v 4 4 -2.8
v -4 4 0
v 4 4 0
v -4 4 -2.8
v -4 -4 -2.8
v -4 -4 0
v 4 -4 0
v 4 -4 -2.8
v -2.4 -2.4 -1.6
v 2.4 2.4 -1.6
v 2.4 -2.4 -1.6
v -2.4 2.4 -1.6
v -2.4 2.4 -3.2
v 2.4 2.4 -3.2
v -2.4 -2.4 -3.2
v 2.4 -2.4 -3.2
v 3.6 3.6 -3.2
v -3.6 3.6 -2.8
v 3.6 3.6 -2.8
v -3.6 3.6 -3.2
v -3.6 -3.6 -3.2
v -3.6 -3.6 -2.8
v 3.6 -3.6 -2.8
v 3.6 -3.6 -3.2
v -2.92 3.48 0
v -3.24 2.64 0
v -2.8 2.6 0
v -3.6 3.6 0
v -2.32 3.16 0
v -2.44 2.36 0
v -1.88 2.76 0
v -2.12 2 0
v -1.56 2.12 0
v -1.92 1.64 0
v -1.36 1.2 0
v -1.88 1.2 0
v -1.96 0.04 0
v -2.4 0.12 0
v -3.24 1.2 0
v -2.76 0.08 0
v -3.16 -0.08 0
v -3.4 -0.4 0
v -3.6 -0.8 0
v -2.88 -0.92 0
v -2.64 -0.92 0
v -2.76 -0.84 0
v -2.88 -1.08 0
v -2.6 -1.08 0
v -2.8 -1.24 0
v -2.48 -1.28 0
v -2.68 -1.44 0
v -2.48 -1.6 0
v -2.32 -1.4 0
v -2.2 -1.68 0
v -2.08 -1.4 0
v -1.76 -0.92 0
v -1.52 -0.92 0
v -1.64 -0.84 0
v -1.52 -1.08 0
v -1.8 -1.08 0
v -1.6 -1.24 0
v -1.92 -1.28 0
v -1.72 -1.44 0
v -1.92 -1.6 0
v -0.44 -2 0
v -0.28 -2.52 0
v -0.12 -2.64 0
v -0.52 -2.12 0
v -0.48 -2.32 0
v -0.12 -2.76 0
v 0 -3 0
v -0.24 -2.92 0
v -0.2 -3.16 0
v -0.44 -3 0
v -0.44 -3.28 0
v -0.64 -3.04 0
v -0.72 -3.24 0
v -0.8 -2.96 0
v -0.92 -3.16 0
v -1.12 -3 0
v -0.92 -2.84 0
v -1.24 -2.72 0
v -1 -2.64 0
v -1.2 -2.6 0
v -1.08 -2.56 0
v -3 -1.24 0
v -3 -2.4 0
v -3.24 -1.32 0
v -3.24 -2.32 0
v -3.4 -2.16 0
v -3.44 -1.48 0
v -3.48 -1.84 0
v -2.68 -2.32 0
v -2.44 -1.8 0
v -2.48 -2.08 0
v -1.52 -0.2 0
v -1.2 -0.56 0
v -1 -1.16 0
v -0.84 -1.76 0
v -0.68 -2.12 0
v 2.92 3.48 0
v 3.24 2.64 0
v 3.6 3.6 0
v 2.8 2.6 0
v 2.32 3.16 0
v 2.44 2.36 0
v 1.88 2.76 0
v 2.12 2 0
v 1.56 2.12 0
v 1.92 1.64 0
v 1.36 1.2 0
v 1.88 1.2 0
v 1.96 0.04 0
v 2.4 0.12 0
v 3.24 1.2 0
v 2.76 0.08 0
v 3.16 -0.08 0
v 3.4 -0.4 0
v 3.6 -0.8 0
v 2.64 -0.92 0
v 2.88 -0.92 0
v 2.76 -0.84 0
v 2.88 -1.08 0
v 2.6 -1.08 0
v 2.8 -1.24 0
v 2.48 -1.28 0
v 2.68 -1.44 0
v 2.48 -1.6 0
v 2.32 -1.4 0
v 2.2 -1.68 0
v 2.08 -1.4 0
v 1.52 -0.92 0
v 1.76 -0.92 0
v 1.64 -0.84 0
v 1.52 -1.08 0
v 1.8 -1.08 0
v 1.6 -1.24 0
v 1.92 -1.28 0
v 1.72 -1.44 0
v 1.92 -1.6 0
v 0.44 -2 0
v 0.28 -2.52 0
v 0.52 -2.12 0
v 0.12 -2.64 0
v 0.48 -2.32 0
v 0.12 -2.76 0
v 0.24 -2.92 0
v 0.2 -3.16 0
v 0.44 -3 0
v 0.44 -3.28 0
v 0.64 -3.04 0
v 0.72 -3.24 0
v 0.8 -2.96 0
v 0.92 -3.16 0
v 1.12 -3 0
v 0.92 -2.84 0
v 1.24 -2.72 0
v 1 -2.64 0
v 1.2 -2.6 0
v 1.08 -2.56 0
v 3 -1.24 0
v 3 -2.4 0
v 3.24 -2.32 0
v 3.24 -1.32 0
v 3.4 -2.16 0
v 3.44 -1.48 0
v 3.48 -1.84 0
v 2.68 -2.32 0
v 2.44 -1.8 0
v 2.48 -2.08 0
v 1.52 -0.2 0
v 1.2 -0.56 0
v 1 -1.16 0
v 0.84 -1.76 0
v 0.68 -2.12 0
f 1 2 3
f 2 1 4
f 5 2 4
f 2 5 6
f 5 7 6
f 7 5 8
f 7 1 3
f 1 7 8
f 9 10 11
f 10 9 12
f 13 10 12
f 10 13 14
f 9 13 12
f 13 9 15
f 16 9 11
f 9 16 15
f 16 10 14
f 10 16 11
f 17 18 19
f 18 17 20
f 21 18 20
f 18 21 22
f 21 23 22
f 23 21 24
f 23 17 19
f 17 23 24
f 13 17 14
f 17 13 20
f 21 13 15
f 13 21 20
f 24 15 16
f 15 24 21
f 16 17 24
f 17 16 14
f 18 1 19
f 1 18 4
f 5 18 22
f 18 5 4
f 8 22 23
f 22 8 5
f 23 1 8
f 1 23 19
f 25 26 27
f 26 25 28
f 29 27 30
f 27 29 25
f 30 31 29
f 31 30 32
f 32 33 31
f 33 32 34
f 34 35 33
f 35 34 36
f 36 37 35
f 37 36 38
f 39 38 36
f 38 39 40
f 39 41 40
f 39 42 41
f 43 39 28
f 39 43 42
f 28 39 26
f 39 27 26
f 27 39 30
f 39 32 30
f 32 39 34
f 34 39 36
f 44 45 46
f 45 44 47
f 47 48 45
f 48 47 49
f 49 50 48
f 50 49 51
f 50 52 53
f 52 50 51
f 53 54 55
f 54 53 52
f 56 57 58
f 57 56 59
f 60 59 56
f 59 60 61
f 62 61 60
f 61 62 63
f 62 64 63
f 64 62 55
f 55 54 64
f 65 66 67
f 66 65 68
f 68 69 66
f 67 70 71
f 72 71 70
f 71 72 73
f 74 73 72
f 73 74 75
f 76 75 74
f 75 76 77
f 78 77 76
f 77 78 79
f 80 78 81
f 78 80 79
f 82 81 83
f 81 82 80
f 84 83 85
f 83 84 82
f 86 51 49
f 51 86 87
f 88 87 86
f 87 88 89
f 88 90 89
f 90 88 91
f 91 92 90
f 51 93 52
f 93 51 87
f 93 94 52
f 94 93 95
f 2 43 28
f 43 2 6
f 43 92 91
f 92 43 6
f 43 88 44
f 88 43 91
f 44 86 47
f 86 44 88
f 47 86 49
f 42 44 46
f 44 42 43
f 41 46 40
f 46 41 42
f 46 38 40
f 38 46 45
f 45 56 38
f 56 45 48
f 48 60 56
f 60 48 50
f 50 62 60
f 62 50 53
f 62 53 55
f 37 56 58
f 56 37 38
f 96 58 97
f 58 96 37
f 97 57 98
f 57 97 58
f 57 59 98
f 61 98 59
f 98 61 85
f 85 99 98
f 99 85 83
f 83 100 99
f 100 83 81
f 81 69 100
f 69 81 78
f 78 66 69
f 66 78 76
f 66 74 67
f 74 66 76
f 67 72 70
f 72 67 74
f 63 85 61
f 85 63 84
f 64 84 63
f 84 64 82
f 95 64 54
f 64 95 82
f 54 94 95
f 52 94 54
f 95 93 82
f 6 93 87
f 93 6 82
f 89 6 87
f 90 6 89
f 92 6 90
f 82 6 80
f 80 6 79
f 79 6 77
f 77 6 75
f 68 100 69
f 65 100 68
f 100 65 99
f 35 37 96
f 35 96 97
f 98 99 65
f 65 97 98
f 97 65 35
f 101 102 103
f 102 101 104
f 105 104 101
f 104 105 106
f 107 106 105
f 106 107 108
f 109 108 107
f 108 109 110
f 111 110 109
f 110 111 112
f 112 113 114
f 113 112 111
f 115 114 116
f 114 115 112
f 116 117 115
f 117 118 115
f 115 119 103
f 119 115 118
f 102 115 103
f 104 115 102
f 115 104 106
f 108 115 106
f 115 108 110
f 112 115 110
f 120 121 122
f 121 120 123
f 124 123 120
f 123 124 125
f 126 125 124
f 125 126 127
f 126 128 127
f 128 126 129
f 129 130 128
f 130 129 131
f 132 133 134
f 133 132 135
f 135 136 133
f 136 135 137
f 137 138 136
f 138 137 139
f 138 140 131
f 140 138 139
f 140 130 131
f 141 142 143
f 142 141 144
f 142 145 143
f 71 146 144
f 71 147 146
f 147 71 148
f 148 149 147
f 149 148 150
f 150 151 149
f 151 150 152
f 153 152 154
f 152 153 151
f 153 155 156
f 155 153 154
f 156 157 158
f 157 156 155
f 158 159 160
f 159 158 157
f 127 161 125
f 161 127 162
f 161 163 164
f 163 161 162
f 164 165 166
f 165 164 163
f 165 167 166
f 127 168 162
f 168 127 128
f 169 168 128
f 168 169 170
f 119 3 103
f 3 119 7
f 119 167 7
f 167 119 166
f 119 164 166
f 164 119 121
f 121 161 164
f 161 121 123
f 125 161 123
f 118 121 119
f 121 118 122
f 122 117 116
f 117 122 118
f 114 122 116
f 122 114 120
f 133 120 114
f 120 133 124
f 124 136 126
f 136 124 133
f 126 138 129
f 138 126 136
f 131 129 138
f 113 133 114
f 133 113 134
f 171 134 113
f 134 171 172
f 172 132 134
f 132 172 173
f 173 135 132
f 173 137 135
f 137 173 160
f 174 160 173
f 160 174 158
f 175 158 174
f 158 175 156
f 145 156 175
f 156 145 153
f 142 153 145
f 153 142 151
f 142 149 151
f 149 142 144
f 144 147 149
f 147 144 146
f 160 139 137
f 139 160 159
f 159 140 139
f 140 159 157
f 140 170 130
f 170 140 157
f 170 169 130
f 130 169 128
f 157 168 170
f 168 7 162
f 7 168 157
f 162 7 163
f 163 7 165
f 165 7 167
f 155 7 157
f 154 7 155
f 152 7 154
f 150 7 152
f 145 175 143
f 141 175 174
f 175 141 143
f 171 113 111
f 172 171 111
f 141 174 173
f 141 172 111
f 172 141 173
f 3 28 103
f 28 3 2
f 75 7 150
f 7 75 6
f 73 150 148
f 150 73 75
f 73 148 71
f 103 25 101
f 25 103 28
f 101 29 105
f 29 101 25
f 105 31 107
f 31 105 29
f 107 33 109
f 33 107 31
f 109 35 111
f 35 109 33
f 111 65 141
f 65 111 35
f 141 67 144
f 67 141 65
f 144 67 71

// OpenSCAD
// file: ../p/box5.scad
use <../lib.scad>
function ldraw_lib__box5() = [
// 0 Box with 5 Faces and All Edges
// 0 Name: box5.dat
// 0 Author: James Jessiman
// 0 !LDRAW_ORG Primitive UPDATE 2012-01
// 0 !LICENSE Licensed under CC BY 4.0 : see CAreadme.txt
// 
// 0 BFC CERTIFY CCW
  [0,"BFC","CERTIFY"],
  [0,"BFC","CCW"],
// 
// 0 !HISTORY 2002-04-03 [sbliss] Modified for BFC compliance
// 0 !HISTORY 2002-04-25 [PTadmin] Official Update 2002-02
// 0 !HISTORY 2007-06-24 [PTadmin] Header formatted for Contributor Agreement
// 0 !HISTORY 2008-07-01 [PTadmin] Official Update 2008-01
// 0 !HISTORY 2012-02-16 [Philo] Changed to CCW
// 0 !HISTORY 2012-03-30 [PTadmin] Official Update 2012-01
// 
// 
// 2 24 1 1 1 -1 1 1
  [2,24,1,1,1,-1,1,1],
// 2 24 -1 1 1 -1 1 -1
  [2,24,-1,1,1,-1,1,-1],
// 2 24 -1 1 -1 1 1 -1
  [2,24,-1,1,-1,1,1,-1],
// 2 24 1 1 -1 1 1 1
  [2,24,1,1,-1,1,1,1],
// 2 24 1 0 1 -1 0 1
  [2,24,1,0,1,-1,0,1],
// 2 24 -1 0 1 -1 0 -1
  [2,24,-1,0,1,-1,0,-1],
// 2 24 -1 0 -1 1 0 -1
  [2,24,-1,0,-1,1,0,-1],
// 2 24 1 0 -1 1 0 1
  [2,24,1,0,-1,1,0,1],
// 2 24 1 0 1 1 1 1
  [2,24,1,0,1,1,1,1],
// 2 24 -1 0 1 -1 1 1
  [2,24,-1,0,1,-1,1,1],
// 2 24 1 0 -1 1 1 -1
  [2,24,1,0,-1,1,1,-1],
// 2 24 -1 0 -1 -1 1 -1
  [2,24,-1,0,-1,-1,1,-1],
// 4 16 -1 1 1 1 1 1 1 1 -1 -1 1 -1
  [4,16,-1,1,1,1,1,1,1,1,-1,-1,1,-1],
// 4 16 -1 1 1 -1 0 1 1 0 1 1 1 1
  [4,16,-1,1,1,-1,0,1,1,0,1,1,1,1],
// 4 16 -1 1 -1 -1 0 -1 -1 0 1 -1 1 1
  [4,16,-1,1,-1,-1,0,-1,-1,0,1,-1,1,1],
// 4 16 1 1 -1 1 0 -1 -1 0 -1 -1 1 -1
  [4,16,1,1,-1,1,0,-1,-1,0,-1,-1,1,-1],
// 4 16 1 1 1 1 0 1 1 0 -1 1 1 -1
  [4,16,1,1,1,1,0,1,1,0,-1,1,1,-1],
];
module ldraw_lib__box5(step=0, col=false, unit=2/5, alt=false, line=0.2, solid=!$preview)
    makepoly(ldraw_lib__box5(), step=step, col=col, unit=unit, alt=alt, line=line, solid=solid);
ldraw_lib__box5(line=0.2);
// file: ../p/box4.scad
use <../lib.scad>
function ldraw_lib__box4() = [
// 0 Box with 4 Faces (2 Parallel Pairs) and All Edges
// 0 Name: box4.dat
// 0 Author: James Jessiman
// 0 !LDRAW_ORG Primitive UPDATE 2012-01
// 0 !LICENSE Licensed under CC BY 4.0 : see CAreadme.txt
// 
// 0 BFC CERTIFY CCW
  [0,"BFC","CERTIFY"],
  [0,"BFC","CCW"],
// 
// 0 !HISTORY 2002-04-03 [sbliss] Modified for BFC compliance
// 0 !HISTORY 2002-04-25 [PTadmin] Official Update 2002-02
// 0 !HISTORY 2007-06-24 [PTadmin] Header formatted for Contributor Agreement
// 0 !HISTORY 2008-07-01 [PTadmin] Official Update 2008-01
// 0 !HISTORY 2012-02-16 [Philo] Changed to CCW
// 0 !HISTORY 2012-03-30 [PTadmin] Official Update 2012-01
// 
// 
// 2 24 1 1 1 -1 1 1
  [2,24,1,1,1,-1,1,1],
// 2 24 -1 1 1 -1 1 -1
  [2,24,-1,1,1,-1,1,-1],
// 2 24 -1 1 -1 1 1 -1
  [2,24,-1,1,-1,1,1,-1],
// 2 24 1 1 -1 1 1 1
  [2,24,1,1,-1,1,1,1],
// 2 24 1 0 1 -1 0 1
  [2,24,1,0,1,-1,0,1],
// 2 24 -1 0 1 -1 0 -1
  [2,24,-1,0,1,-1,0,-1],
// 2 24 -1 0 -1 1 0 -1
  [2,24,-1,0,-1,1,0,-1],
// 2 24 1 0 -1 1 0 1
  [2,24,1,0,-1,1,0,1],
// 2 24 1 0 1 1 1 1
  [2,24,1,0,1,1,1,1],
// 2 24 -1 0 1 -1 1 1
  [2,24,-1,0,1,-1,1,1],
// 2 24 1 0 -1 1 1 -1
  [2,24,1,0,-1,1,1,-1],
// 2 24 -1 0 -1 -1 1 -1
  [2,24,-1,0,-1,-1,1,-1],
// 4 16 -1 1 1 -1 0 1 1 0 1 1 1 1
  [4,16,-1,1,1,-1,0,1,1,0,1,1,1,1],
// 4 16 -1 1 -1 -1 0 -1 -1 0 1 -1 1 1
  [4,16,-1,1,-1,-1,0,-1,-1,0,1,-1,1,1],
// 4 16 1 1 -1 1 0 -1 -1 0 -1 -1 1 -1
  [4,16,1,1,-1,1,0,-1,-1,0,-1,-1,1,-1],
// 4 16 1 1 1 1 0 1 1 0 -1 1 1 -1
  [4,16,1,1,1,1,0,1,1,0,-1,1,1,-1],
];
module ldraw_lib__box4(step=0, col=false, unit=2/5, alt=false, line=0.2, solid=!$preview)
    makepoly(ldraw_lib__box4(), step=step, col=col, unit=unit, alt=alt, line=line, solid=solid);
ldraw_lib__box4(line=0.2);
// file: s/3070bs01.scad
use <../../lib.scad>
use <../../p/box4.scad>
use <../../p/box5.scad>
function ldraw_lib__s__3070bs01() = [
// 0 ~Tile  1 x  1 with Groove without Top Face
// 0 Name: s\3070bs01.dat
// 0 Author: Chris Dee [cwdee]
// 0 !LDRAW_ORG Subpart UPDATE 2009-02
// 0 !LICENSE Licensed under CC BY 4.0 : see CAreadme.txt
// 
// 0 BFC CERTIFY CCW
  [0,"BFC","CERTIFY"],
  [0,"BFC","CCW"],
// 
// 0 !HISTORY 2009-09-03 [PTadmin] Official Update 2009-02
// 
// 
// 1 16 0 0 0 10 0 0 0 7 0 0 0 10 box4.dat
  [1,16,0,0,0,10,0,0,0,7,0,0,0,10, ldraw_lib__box4()],
// 0 BFC INVERTNEXT
  [0,"BFC","INVERTNEXT"],
// 1 16 0 8 0 6 0 0 0 -4 0 0 0 6 box5.dat
  [1,16,0,8,0,6,0,0,0,-4,0,0,0,6, ldraw_lib__box5()],
// 1 16 0 7 0 9 0 0 0 1 0 0 0 9 box4.dat
  [1,16,0,7,0,9,0,0,0,1,0,0,0,9, ldraw_lib__box4()],
// 
// 4 16 9 8 9 6 8 6 -6 8 6 -9 8 9
  [4,16,9,8,9,6,8,6,-6,8,6,-9,8,9],
// 4 16 -9 8 9 -6 8 6 -6 8 -6 -9 8 -9
  [4,16,-9,8,9,-6,8,6,-6,8,-6,-9,8,-9],
// 4 16 -9 8 -9 -6 8 -6 6 8 -6 9 8 -9
  [4,16,-9,8,-9,-6,8,-6,6,8,-6,9,8,-9],
// 4 16 9 8 -9 6 8 -6 6 8 6 9 8 9
  [4,16,9,8,-9,6,8,-6,6,8,6,9,8,9],
// 
// 4 16 10 7 10 9 7 9 -9 7 9 -10 7 10
  [4,16,10,7,10,9,7,9,-9,7,9,-10,7,10],
// 4 16 -10 7 10 -9 7 9 -9 7 -9 -10 7 -10
  [4,16,-10,7,10,-9,7,9,-9,7,-9,-10,7,-10],
// 4 16 -10 7 -10 -9 7 -9 9 7 -9 10 7 -10
  [4,16,-10,7,-10,-9,7,-9,9,7,-9,10,7,-10],
// 4 16 10 7 -10 9 7 -9 9 7 9 10 7 10
  [4,16,10,7,-10,9,7,-9,9,7,9,10,7,10],
// 0
];
module ldraw_lib__s__3070bs01(step=0, col=false, unit=2/5, alt=false, line=0.2, solid=!$preview)
    makepoly(ldraw_lib__s__3070bs01(), step=step, col=col, unit=unit, alt=alt, line=line, solid=solid);
ldraw_lib__s__3070bs01(line=0.2);
// main file
use <../lib.scad>
use <s/3070bp1ss01.scad>
use <s/3070bs01.scad>
function ldraw_lib__3070bp1s() = [
// 0 Tile  1 x  1 with Medium Lavender Dog Face on Bright Light Blue Background Pattern
// 0 Name: 3070bp1s.dat
// 0 Author: Takeshi Takahashi [RainbowDolphin]
// 0 !LDRAW_ORG Part UPDATE 2025-11
// 0 !LICENSE Licensed under CC BY 4.0 : see CAreadme.txt
// 
// 0 BFC CERTIFY CCW
  [0,"BFC","CERTIFY"],
  [0,"BFC","CCW"],
// 
// 0 !KEYWORDS animal, BrickLink 3070pb187, Brickowl 533905, Dots, Extra
// 0 !KEYWORDS Rebrickable 3070bpr9990, Series 3, Set 41921
// 
// 0 !HISTORY 2025-11-30 [OrionP] Official Update 2025-11
// 
// 1 16 0 0 0 1 0 0 0 1 0 0 0 1 s\3070bs01.dat
  [1,16,0,0,0,1,0,0,0,1,0,0,0,1, ldraw_lib__s__3070bs01()],
// 1 16 0 0 0 1 0 0 0 1 0 0 0 1 s\3070bp1ss01.dat
  [1,16,0,0,0,1,0,0,0,1,0,0,0,1, ldraw_lib__s__3070bp1ss01()],
// 1 16 0 0 0 -1 0 0 0 1 0 0 0 1 s\3070bp1ss01.dat
  [1,16,0,0,0,-1,0,0,0,1,0,0,0,1, ldraw_lib__s__3070bp1ss01()],
// 4 16 -10 0 10 -9 0 9 9 0 9 10 0 10
  [4,16,-10,0,10,-9,0,9,9,0,9,10,0,10],
// 4 16 1.1 0 -8.2 -1.1 0 -8.2 -10 0 -10 10 0 -10
  [4,16,1.1,0,-8.2,-1.1,0,-8.2,-10,0,-10,10,0,-10],
// 4 16 -1.1 0 -8.2 1.1 0 -8.2 .5 0 -7.9 -.5 0 -7.9
  [4,16,-1.1,0,-8.2,1.1,0,-8.2,.5,0,-7.9,-.5,0,-7.9],
// 3 16 -.5 0 -7.9 .5 0 -7.9 0 0 -7.5
  [3,16,-.5,0,-7.9,.5,0,-7.9,0,0,-7.5],
// 4 212 -9 0 9 -7.3 0 8.7 7.3 0 8.7 9 0 9
  [4,212,-9,0,9,-7.3,0,8.7,7.3,0,8.7,9,0,9],
// 4 212 -5.8 0 7.9 5.8 0 7.9 7.3 0 8.7 -7.3 0 8.7
  [4,212,-5.8,0,7.9,5.8,0,7.9,7.3,0,8.7,-7.3,0,8.7],
// 4 212 -5.8 0 7.9 -4.7 0 6.9 4.7 0 6.9 5.8 0 7.9
  [4,212,-5.8,0,7.9,-4.7,0,6.9,4.7,0,6.9,5.8,0,7.9],
// 4 212 -4.7 0 6.9 -3.9 0 5.3 3.9 0 5.3 4.7 0 6.9
  [4,212,-4.7,0,6.9,-3.9,0,5.3,3.9,0,5.3,4.7,0,6.9],
// 4 212 -3.9 0 5.3 -3.4 0 3 3.4 0 3 3.9 0 5.3
  [4,212,-3.9,0,5.3,-3.4,0,3,3.4,0,3,3.9,0,5.3],
// 4 30 1.1 0 -5 3.4 0 3 -3.4 0 3 -1.1 0 -5
  [4,30,1.1,0,-5,3.4,0,3,-3.4,0,3,-1.1,0,-5],
// 4 85 .3 0 -6.6 1.1 0 -5 -1.1 0 -5 -.3 0 -6.6
  [4,85,.3,0,-6.6,1.1,0,-5,-1.1,0,-5,-.3,0,-6.6],
// 3 85 .3 0 -6.6 -.3 0 -6.6 0 0 -7.5
  [3,85,.3,0,-6.6,-.3,0,-6.6,0,0,-7.5],
];
module ldraw_lib__3070bp1s(step=0, col=false, unit=2/5, alt=false, line=0.2, solid=!$preview)
    makepoly(ldraw_lib__3070bp1s(), step=step, col=col, unit=unit, alt=alt, line=line, solid=solid);
ldraw_lib__3070bp1s(line=0.2);
